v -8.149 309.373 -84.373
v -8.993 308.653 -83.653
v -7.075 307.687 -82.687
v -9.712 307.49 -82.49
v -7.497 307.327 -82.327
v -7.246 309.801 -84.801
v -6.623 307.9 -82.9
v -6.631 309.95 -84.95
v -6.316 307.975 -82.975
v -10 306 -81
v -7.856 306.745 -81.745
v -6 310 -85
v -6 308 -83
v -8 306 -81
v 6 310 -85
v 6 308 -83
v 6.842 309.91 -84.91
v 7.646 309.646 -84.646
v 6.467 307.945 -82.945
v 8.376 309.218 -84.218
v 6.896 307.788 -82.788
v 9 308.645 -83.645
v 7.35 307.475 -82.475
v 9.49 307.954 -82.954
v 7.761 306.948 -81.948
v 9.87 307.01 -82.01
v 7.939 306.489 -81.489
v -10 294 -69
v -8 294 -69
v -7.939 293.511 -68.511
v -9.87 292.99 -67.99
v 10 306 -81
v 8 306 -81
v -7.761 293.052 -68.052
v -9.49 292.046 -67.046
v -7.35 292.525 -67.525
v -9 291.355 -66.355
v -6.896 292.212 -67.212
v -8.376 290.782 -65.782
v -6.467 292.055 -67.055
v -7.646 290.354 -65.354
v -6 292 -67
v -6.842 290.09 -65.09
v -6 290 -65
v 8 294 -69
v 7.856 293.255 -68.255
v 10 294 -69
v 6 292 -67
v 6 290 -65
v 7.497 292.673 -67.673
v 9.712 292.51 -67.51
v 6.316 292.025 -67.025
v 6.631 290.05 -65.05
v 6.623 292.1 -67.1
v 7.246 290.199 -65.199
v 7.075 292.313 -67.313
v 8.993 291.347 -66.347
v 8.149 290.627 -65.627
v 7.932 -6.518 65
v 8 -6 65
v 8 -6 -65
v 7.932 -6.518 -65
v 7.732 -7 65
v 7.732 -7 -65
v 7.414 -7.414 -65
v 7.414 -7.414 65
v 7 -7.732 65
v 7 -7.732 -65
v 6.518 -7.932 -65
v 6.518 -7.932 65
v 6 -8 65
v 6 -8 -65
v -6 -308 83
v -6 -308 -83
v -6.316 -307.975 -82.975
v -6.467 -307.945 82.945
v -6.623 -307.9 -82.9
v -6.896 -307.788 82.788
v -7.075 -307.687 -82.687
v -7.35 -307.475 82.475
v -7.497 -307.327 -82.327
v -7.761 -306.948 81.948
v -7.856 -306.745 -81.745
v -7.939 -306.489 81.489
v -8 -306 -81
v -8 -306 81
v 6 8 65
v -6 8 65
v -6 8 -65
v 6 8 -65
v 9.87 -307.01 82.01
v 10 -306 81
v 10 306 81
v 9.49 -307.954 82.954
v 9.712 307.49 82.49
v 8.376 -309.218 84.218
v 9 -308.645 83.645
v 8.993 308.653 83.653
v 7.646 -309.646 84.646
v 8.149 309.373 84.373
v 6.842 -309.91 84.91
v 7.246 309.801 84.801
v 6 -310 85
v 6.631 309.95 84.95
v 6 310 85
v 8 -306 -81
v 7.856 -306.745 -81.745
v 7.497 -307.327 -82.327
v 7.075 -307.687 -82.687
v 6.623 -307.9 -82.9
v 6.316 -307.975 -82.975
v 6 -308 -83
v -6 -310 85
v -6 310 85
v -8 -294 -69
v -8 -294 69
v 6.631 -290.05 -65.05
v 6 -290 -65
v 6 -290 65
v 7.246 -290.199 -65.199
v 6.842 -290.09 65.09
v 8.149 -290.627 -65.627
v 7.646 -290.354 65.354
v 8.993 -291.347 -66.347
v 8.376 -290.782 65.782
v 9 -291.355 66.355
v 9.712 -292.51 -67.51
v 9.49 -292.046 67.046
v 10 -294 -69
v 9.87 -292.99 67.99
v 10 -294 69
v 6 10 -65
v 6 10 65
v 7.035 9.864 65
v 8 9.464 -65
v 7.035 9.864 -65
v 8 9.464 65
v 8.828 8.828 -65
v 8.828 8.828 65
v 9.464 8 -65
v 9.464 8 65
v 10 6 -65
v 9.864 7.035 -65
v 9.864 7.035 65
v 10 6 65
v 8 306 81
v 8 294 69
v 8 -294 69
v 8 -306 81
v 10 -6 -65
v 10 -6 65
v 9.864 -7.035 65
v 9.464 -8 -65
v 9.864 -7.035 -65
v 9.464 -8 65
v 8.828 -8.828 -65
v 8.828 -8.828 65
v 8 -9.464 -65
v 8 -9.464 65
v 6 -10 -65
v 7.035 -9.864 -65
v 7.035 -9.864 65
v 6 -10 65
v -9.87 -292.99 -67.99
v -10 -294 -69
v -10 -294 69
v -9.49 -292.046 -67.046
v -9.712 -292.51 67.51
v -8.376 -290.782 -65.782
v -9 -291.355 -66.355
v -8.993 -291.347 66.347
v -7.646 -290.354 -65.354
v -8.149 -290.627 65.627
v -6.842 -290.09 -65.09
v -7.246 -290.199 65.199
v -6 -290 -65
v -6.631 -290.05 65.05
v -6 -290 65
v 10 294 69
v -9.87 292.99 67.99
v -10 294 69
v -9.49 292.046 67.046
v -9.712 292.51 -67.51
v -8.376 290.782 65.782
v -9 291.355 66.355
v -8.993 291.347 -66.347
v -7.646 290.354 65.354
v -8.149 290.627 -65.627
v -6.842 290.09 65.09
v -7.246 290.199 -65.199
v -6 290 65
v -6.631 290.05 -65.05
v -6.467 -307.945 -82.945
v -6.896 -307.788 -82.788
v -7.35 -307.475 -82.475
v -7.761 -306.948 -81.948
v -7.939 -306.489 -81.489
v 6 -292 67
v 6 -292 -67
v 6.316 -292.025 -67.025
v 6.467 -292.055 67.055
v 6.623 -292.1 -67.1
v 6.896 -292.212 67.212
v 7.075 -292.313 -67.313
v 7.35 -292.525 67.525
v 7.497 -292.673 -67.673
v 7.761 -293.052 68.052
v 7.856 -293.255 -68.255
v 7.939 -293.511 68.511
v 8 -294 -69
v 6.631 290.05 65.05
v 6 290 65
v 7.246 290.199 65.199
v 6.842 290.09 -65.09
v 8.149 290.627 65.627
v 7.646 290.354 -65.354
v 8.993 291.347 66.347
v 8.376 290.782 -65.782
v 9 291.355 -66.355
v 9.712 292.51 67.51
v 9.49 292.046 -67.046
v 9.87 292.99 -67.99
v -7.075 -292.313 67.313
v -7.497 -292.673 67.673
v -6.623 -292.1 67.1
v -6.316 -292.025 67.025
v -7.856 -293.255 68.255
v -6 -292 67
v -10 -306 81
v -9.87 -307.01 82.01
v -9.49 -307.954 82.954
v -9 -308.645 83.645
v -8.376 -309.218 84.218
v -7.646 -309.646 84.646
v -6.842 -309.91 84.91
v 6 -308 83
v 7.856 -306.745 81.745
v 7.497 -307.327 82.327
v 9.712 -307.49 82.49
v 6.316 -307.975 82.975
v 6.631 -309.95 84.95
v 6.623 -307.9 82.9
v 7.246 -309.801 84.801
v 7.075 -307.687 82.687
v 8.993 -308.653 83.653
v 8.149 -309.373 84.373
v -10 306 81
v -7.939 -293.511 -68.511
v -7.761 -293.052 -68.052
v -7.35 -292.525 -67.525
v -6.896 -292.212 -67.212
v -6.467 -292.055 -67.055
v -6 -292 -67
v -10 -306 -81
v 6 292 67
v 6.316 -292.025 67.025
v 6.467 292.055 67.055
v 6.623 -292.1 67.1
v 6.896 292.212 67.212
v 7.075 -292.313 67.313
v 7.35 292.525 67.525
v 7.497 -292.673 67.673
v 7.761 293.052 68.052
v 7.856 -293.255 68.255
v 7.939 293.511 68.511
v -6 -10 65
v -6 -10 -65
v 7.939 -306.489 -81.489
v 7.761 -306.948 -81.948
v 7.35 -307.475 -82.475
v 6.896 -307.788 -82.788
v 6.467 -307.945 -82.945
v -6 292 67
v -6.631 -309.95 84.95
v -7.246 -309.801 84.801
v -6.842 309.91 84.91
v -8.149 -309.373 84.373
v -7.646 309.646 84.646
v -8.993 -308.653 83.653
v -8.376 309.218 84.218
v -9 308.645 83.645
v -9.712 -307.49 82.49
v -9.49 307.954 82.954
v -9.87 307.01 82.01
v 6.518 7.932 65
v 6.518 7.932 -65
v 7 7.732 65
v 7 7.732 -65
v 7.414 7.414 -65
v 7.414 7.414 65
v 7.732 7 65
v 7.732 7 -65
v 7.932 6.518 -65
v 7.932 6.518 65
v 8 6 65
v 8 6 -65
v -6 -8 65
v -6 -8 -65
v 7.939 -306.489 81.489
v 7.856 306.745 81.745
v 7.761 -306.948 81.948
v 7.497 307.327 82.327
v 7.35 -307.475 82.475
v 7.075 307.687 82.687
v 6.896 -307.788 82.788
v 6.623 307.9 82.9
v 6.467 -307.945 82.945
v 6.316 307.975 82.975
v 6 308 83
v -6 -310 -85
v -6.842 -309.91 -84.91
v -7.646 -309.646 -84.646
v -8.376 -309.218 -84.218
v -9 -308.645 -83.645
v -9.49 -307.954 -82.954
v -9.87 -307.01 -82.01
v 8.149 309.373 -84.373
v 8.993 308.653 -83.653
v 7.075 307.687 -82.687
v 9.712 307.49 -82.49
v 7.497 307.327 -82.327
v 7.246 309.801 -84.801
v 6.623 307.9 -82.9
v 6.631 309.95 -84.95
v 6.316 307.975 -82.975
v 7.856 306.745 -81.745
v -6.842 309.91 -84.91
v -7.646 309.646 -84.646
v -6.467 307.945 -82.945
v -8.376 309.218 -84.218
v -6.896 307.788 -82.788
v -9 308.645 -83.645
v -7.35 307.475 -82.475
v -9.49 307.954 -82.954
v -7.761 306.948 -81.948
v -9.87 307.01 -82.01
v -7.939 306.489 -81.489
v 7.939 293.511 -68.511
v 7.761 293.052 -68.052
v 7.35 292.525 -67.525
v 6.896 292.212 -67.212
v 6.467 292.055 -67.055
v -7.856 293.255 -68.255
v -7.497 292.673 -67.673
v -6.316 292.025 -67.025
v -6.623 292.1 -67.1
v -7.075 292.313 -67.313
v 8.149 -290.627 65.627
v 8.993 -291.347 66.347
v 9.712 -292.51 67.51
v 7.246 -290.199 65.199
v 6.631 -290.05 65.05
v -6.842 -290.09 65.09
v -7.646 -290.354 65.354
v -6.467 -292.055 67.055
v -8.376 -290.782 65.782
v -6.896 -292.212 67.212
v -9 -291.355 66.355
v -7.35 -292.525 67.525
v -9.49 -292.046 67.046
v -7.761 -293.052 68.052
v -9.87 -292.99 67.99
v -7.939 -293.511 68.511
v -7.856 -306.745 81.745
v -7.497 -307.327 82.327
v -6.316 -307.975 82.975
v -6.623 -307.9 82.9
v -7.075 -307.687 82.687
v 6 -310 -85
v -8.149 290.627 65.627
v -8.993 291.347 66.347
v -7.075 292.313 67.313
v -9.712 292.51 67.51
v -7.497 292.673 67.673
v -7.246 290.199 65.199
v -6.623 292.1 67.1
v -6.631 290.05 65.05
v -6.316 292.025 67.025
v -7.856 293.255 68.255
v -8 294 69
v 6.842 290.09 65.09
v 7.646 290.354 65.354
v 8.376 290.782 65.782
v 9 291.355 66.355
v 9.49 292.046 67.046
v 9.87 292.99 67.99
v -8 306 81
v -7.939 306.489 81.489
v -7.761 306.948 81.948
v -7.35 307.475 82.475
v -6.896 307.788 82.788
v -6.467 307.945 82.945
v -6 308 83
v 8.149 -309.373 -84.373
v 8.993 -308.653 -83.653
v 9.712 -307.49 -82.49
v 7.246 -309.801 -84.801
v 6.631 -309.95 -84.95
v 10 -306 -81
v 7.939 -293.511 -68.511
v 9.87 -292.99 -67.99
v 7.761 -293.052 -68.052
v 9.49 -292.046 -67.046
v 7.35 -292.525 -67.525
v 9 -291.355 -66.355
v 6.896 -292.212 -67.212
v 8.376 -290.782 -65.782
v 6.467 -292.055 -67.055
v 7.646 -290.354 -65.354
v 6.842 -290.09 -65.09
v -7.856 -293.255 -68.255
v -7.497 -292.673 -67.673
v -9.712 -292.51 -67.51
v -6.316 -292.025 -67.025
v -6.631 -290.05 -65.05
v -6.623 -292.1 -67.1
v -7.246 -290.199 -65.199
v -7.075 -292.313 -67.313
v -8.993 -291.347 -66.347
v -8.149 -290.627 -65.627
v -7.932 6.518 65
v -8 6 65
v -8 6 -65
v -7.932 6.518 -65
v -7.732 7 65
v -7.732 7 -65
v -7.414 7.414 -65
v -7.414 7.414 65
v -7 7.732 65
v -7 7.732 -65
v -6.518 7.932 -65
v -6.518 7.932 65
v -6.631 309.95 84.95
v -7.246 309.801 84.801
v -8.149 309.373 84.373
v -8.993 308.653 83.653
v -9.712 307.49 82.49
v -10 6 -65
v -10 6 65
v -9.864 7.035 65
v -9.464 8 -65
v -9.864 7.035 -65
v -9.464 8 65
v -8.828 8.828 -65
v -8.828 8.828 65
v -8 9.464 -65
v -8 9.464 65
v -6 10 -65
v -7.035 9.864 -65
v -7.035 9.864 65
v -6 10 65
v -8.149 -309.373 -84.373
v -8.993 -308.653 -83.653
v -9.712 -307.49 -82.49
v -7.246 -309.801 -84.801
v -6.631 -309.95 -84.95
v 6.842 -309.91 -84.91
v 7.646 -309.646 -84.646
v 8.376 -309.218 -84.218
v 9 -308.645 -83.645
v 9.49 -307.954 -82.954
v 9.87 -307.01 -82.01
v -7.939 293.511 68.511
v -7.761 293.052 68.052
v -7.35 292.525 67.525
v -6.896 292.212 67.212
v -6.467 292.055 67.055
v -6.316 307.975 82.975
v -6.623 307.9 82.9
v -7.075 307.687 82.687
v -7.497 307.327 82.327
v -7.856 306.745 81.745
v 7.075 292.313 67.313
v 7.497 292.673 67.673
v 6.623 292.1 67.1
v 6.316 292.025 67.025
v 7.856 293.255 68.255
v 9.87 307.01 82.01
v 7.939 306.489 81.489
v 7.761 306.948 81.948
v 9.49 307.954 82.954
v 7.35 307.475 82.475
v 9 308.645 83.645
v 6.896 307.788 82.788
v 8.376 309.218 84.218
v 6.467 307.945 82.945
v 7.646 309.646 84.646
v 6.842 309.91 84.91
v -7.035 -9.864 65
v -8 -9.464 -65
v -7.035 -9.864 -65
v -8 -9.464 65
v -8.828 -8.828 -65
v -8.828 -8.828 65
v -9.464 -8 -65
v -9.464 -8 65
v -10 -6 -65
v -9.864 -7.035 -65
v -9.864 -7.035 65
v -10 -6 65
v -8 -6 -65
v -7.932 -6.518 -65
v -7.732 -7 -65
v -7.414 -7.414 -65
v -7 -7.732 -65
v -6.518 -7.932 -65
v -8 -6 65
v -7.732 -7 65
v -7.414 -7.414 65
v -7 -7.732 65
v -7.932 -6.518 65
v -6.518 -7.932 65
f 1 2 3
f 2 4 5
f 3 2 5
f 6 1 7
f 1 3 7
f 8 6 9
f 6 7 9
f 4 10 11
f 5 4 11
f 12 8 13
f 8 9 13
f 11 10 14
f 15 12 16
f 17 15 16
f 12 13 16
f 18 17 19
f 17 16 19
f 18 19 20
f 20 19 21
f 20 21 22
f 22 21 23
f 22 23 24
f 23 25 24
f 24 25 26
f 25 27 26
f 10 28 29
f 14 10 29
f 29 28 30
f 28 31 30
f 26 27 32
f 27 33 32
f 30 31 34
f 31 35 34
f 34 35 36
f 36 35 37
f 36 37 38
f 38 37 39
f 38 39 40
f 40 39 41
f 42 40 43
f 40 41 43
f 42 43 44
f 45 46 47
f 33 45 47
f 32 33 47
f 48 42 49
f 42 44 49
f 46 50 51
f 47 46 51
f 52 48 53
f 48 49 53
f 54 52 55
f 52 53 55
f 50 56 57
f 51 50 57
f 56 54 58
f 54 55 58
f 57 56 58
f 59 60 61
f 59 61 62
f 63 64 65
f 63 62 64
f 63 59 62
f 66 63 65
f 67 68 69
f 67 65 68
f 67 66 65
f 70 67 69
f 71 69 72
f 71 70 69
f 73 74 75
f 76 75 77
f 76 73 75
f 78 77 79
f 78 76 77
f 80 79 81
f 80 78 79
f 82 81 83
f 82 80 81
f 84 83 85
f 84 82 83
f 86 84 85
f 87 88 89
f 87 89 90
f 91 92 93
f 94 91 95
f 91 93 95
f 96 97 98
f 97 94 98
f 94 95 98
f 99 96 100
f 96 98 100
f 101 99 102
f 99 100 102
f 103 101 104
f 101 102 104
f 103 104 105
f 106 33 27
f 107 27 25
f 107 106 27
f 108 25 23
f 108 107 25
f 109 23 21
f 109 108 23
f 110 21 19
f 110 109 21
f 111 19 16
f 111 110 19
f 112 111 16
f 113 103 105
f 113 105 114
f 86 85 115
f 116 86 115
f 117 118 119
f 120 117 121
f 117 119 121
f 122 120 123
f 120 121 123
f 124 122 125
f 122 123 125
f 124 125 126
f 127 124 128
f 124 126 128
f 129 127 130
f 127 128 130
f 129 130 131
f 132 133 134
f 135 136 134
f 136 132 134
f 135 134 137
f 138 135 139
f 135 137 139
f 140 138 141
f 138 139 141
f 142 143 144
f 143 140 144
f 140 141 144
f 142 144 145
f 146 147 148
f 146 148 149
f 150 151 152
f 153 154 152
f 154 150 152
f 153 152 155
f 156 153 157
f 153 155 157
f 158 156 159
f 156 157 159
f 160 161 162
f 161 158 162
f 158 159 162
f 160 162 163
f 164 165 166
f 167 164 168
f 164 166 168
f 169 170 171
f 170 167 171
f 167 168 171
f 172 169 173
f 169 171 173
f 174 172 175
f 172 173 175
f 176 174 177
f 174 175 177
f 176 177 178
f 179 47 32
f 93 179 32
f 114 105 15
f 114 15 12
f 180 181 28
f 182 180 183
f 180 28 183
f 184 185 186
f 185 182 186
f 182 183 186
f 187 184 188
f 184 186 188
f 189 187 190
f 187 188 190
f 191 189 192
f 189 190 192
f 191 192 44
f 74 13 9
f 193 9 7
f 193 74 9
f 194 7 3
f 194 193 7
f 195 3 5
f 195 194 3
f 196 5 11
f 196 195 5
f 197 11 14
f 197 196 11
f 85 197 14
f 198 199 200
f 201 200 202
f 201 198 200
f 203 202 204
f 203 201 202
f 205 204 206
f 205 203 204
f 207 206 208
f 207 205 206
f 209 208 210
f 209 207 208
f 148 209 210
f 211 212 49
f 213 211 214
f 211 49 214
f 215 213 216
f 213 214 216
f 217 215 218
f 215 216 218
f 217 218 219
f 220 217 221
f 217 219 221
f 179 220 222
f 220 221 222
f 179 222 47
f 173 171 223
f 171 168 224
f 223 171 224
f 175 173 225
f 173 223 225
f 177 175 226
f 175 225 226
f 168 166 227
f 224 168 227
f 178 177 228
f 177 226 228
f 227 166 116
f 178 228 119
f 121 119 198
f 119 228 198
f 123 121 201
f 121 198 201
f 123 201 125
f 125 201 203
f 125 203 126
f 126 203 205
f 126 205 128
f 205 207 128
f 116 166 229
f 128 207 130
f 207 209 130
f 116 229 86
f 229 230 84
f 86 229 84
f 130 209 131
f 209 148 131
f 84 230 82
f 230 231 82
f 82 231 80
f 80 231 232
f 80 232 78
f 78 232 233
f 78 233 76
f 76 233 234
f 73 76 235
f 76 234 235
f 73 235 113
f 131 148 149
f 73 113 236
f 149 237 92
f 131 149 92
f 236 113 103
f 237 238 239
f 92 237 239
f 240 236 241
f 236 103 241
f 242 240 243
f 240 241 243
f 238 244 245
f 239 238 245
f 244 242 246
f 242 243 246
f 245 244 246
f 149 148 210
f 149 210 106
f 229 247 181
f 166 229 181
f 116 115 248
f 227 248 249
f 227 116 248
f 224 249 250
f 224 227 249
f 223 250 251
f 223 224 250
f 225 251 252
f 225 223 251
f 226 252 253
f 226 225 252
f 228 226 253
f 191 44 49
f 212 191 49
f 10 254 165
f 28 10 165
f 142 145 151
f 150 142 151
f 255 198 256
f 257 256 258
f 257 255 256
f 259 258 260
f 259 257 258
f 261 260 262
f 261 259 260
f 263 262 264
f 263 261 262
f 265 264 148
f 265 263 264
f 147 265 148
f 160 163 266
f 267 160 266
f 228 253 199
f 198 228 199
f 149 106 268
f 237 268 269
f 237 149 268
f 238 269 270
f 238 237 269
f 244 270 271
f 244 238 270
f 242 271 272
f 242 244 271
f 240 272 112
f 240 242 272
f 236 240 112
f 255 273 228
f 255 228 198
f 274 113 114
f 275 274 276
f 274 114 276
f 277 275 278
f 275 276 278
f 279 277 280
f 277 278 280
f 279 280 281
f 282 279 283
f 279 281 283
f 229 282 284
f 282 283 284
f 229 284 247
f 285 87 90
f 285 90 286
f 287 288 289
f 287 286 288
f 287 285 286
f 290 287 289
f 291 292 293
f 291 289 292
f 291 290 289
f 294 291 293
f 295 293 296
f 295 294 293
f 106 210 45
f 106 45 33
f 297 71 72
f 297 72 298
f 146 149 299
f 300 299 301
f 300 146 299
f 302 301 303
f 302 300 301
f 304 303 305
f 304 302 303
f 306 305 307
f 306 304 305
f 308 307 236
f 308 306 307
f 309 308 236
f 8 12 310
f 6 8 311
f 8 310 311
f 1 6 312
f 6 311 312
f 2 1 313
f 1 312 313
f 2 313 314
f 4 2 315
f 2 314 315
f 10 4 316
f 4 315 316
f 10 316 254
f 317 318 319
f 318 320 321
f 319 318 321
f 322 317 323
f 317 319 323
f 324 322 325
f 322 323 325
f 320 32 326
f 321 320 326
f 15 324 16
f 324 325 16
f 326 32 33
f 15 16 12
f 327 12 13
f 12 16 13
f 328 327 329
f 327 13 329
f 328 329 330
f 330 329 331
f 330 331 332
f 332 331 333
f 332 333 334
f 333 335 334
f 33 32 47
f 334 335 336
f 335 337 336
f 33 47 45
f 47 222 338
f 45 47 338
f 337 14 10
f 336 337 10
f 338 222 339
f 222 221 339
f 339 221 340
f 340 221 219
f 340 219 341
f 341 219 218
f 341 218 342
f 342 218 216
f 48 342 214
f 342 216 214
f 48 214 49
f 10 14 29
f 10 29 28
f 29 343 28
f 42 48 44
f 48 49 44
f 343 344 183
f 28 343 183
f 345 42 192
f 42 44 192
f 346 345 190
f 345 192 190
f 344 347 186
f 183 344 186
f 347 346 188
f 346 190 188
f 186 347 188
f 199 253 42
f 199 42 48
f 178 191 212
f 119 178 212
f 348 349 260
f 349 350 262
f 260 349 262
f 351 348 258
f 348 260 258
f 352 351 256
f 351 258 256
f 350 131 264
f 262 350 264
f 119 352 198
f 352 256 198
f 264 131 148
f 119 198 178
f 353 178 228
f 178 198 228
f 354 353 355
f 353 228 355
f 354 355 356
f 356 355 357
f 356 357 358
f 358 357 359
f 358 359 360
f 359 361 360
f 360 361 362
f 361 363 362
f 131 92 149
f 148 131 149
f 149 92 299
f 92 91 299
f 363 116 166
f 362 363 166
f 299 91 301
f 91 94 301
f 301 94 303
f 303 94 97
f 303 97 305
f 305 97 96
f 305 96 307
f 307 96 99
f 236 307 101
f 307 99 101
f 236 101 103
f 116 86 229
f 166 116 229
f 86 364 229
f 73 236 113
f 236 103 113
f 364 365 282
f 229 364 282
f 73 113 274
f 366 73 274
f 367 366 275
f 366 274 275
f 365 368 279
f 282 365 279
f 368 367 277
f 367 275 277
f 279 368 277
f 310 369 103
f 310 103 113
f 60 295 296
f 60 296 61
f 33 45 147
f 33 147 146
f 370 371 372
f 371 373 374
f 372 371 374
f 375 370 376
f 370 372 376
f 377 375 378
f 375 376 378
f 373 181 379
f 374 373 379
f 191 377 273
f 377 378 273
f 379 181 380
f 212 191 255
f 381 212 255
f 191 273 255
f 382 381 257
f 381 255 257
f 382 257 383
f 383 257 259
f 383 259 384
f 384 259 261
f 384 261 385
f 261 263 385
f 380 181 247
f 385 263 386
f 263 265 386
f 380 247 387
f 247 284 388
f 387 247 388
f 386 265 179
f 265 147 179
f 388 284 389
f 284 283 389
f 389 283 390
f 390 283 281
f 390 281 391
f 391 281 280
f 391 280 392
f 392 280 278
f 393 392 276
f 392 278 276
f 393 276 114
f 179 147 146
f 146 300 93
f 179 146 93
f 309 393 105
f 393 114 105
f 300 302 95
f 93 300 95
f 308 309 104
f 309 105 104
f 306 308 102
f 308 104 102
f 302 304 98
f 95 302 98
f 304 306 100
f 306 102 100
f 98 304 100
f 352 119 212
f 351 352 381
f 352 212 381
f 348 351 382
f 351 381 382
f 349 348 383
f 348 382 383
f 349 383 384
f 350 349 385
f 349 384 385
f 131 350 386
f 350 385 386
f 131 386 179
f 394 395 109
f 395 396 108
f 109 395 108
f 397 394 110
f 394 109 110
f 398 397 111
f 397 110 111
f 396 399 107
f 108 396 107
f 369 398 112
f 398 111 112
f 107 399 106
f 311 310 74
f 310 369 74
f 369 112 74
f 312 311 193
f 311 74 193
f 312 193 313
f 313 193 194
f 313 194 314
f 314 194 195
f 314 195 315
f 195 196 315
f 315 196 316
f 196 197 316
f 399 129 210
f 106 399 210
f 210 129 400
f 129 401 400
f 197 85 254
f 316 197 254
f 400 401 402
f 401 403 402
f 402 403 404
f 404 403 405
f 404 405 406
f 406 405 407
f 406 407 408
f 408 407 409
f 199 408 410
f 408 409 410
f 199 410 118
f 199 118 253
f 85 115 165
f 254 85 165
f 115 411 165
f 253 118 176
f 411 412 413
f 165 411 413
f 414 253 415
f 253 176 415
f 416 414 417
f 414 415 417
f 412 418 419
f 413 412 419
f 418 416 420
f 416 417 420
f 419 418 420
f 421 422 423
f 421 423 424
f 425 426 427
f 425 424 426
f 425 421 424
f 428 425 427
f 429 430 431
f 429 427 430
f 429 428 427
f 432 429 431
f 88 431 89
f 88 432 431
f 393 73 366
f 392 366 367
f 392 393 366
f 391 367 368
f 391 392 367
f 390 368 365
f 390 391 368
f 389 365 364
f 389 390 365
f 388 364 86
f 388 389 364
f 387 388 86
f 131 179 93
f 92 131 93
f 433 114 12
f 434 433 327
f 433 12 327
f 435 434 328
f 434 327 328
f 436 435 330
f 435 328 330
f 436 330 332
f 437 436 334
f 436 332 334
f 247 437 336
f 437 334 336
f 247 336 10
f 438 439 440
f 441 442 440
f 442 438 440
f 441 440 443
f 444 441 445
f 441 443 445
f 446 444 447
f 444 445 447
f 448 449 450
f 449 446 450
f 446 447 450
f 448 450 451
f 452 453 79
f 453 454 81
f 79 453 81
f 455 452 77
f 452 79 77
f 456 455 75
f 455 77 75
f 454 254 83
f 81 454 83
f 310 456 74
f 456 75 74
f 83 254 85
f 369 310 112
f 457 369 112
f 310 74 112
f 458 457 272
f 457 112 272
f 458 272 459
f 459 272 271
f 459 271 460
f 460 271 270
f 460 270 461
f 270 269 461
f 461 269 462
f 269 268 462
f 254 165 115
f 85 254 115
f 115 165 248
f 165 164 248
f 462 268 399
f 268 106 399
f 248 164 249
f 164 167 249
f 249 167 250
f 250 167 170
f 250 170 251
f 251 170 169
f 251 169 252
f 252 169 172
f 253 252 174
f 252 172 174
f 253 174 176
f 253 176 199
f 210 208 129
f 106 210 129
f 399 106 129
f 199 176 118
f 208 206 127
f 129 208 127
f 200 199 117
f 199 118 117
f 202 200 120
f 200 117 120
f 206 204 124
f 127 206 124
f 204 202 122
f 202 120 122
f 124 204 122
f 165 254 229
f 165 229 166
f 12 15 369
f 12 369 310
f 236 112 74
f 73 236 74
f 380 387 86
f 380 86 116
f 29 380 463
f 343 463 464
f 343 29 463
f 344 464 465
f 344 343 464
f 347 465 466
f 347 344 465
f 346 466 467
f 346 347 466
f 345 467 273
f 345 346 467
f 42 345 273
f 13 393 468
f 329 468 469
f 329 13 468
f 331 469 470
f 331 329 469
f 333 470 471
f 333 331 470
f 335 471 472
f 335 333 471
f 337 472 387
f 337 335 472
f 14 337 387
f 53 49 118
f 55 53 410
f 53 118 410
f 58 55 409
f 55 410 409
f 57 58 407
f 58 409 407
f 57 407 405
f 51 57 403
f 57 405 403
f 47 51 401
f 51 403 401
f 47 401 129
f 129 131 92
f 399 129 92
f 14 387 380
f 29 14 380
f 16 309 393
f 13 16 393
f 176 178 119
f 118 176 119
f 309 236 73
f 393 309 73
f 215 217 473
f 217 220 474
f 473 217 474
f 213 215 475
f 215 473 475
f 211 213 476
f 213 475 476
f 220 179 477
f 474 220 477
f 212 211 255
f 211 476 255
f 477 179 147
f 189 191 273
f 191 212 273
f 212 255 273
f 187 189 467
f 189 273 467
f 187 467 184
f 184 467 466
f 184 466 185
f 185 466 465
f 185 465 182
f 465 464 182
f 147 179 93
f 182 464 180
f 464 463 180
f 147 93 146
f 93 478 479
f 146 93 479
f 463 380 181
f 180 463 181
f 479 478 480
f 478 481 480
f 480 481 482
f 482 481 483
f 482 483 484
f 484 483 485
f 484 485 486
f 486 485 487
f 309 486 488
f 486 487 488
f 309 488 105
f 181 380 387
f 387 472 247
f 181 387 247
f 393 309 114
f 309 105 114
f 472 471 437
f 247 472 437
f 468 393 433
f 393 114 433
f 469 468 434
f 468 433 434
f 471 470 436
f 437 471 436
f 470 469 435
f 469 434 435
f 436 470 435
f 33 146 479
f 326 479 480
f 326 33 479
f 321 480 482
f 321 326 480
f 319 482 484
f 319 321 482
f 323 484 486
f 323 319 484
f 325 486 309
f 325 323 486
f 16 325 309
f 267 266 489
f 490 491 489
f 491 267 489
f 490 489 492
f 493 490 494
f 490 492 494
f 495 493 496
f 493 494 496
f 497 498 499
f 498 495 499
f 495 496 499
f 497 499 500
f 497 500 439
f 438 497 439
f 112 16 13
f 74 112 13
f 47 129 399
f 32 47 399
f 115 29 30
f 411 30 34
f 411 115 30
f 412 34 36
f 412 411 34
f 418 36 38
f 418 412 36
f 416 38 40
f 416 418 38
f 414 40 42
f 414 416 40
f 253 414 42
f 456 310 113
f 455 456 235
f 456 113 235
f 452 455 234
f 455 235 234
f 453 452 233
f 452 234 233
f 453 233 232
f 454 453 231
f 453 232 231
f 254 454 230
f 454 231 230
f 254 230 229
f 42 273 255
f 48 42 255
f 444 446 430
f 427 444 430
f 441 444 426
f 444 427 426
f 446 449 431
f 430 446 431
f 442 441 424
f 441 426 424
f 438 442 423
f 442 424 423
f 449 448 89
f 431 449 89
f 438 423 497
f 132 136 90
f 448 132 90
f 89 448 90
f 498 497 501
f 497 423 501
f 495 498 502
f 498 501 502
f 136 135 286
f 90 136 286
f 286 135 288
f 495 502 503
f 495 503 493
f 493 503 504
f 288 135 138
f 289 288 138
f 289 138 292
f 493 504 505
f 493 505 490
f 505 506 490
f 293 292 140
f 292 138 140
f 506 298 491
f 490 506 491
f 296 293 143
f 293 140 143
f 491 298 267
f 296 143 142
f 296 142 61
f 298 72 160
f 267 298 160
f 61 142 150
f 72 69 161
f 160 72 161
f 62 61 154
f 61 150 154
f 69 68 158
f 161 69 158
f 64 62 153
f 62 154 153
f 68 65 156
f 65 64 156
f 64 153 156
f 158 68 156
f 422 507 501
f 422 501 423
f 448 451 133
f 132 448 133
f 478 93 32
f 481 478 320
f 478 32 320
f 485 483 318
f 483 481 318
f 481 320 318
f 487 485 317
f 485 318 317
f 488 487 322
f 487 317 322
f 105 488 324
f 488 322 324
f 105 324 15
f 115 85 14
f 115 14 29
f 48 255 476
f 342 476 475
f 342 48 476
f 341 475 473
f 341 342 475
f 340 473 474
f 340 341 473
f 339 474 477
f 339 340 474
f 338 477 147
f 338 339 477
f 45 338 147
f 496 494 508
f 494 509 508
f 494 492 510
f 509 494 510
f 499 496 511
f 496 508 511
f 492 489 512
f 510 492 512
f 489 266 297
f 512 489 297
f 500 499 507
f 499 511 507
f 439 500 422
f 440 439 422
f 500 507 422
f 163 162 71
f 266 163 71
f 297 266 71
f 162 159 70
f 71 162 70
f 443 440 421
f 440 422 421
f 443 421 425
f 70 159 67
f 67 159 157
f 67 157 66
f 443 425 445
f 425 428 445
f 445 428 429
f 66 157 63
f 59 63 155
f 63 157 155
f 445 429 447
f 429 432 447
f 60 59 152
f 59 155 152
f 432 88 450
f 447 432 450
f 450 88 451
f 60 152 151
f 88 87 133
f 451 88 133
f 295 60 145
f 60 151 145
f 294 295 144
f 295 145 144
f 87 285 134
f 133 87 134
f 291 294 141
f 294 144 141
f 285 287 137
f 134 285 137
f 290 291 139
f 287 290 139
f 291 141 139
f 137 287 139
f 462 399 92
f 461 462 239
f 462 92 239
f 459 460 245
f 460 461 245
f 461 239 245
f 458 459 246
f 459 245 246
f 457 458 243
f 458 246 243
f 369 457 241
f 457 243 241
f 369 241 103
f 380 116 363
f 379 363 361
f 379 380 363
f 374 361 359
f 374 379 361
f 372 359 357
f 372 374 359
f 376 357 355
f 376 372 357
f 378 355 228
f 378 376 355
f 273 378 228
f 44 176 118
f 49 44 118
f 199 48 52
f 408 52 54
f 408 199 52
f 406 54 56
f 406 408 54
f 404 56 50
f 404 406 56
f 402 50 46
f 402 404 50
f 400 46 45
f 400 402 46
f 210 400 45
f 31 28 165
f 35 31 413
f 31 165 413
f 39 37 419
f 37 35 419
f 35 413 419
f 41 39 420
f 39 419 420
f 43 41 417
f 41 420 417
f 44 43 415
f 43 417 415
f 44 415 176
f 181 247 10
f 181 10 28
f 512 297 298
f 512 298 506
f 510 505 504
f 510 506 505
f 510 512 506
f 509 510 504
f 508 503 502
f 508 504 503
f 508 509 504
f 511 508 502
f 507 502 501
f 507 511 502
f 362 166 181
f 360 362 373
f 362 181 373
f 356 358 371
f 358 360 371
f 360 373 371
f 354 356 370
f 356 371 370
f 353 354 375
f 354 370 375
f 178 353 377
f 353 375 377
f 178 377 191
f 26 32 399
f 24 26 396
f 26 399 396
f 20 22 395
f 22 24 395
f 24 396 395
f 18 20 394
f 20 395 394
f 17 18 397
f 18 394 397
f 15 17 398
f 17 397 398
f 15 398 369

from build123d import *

# Parameters (mm, degrees)
TUBO_CUADRADO_20_X_20_X_2_1_DEPTH      = 615.142135624
TUBO_CUADRADO_20_X_20_X_2_1_DEPTH_BACK = 15.142135624
TUBO_CUADRADO_20_X_20_X_2_1_2_DEPTH    = 180.284271247
TUBO_CUADRADO_20_X_20_X_2_1_3_DEPTH    = 630.284271247
TUBO_CUADRADO_20_X_20_X_2_1_4_DEPTH    = 180.284271247
TUBO_CUADRADO_20_X_20_X_2_1_5_DEPTH    = 152


with BuildPart() as part:
    # Sketch1 → Tubo cuadrado 20 X 20 X 2(1) (new, two sides: drawn at the far end of the back side and taken through both)
    with BuildSketch(Plane(origin=(0, 300, 75), x_dir=(0, 0, -1), z_dir=(0, -1, 0)).offset(-TUBO_CUADRADO_20_X_20_X_2_1_DEPTH_BACK)):
        with BuildLine():
            Line((-6, -10), (6, -10))
            ThreePointArc((6, -10), (8.828427125, -8.828427125), (10, -6))
            Line((10, -6), (10, 6))
            ThreePointArc((10, 6), (8.828427125, 8.828427125), (6, 10))
            Line((6, 10), (-6, 10))
            ThreePointArc((-6, 10), (-8.828427125, 8.828427125), (-10, 6))
            Line((-10, 6), (-10, -6))
            ThreePointArc((-10, -6), (-8.828427125, -8.828427125), (-6, -10))
        make_face()
        with BuildLine():
            Line((-6, -8), (6, -8))
            ThreePointArc((6, -8), (7.414213562, -7.414213562), (8, -6))
            Line((8, -6), (8, 6))
            ThreePointArc((8, 6), (7.414213562, 7.414213562), (6, 8))
            Line((6, 8), (-6, 8))
            ThreePointArc((-6, 8), (-7.414213562, 7.414213562), (-8, 6))
            Line((-8, 6), (-8, -6))
            ThreePointArc((-8, -6), (-7.414213562, -7.414213562), (-6, -8))
        make_face(mode=Mode.SUBTRACT)
    extrude(amount=TUBO_CUADRADO_20_X_20_X_2_1_DEPTH + TUBO_CUADRADO_20_X_20_X_2_1_DEPTH_BACK)

    # Tubo cuadrado 20 X 20 X 2(1) mitre 1
    split(bisect_by=Plane(origin=(0, 300, 75), x_dir=(1, 0, 0), z_dir=(0, -0.707106781, 0.707106781)), keep=Keep.TOP)

    # Tubo cuadrado 20 X 20 X 2(1) mitre 2
    split(bisect_by=Plane(origin=(0, -300, 75), x_dir=(-1, 0, 0), z_dir=(0, 0.707106781, 0.707106781)), keep=Keep.TOP)


with BuildPart() as body_2:
    # Sketch1 on segment 2 (carried to segment 2) → Tubo cuadrado 20 X 20 X 2_1 2 (new body)
    with BuildSketch(Plane(origin=(0, -300, 90.142135624), x_dir=(0, 1, 0), z_dir=(0, 0, -1))):
        with BuildLine():
            Line((-6, -10), (6, -10))
            ThreePointArc((6, -10), (8.828427125, -8.828427125), (10, -6))
            Line((10, -6), (10, 6))
            ThreePointArc((10, 6), (8.828427125, 8.828427125), (6, 10))
            Line((6, 10), (-6, 10))
            ThreePointArc((-6, 10), (-8.828427125, 8.828427125), (-10, 6))
            Line((-10, 6), (-10, -6))
            ThreePointArc((-10, -6), (-8.828427125, -8.828427125), (-6, -10))
        make_face()
        with BuildLine():
            Line((-6, -8), (6, -8))
            ThreePointArc((6, -8), (7.414213562, -7.414213562), (8, -6))
            Line((8, -6), (8, 6))
            ThreePointArc((8, 6), (7.414213562, 7.414213562), (6, 8))
            Line((6, 8), (-6, 8))
            ThreePointArc((-6, 8), (-7.414213562, 7.414213562), (-8, 6))
            Line((-8, 6), (-8, -6))
            ThreePointArc((-8, -6), (-7.414213562, -7.414213562), (-6, -8))
        make_face(mode=Mode.SUBTRACT)
    extrude(amount=TUBO_CUADRADO_20_X_20_X_2_1_2_DEPTH)

    # Tubo cuadrado 20 X 20 X 2_1 2 mitre 1
    split(bisect_by=Plane(origin=(0, -300, 75), x_dir=(1, 0, 0), z_dir=(0, -0.707106781, -0.707106781)), keep=Keep.TOP)

    # Tubo cuadrado 20 X 20 X 2_1 2 mitre 2
    split(bisect_by=Plane(origin=(0, -300, -75), x_dir=(1, 0, 0), z_dir=(0, -0.707106781, 0.707106781)), keep=Keep.TOP)


with BuildPart() as body_3:
    # Sketch1 on segment 3 (carried to segment 3) → Tubo cuadrado 20 X 20 X 2_1 3 (new body)
    with BuildSketch(Plane(origin=(0, -315.142135624, -75), x_dir=(0, 0, 1), z_dir=(0, 1, 0))):
        with BuildLine():
            Line((-6, -10), (6, -10))
            ThreePointArc((6, -10), (8.828427125, -8.828427125), (10, -6))
            Line((10, -6), (10, 6))
            ThreePointArc((10, 6), (8.828427125, 8.828427125), (6, 10))
            Line((6, 10), (-6, 10))
            ThreePointArc((-6, 10), (-8.828427125, 8.828427125), (-10, 6))
            Line((-10, 6), (-10, -6))
            ThreePointArc((-10, -6), (-8.828427125, -8.828427125), (-6, -10))
        make_face()
        with BuildLine():
            Line((-6, -8), (6, -8))
            ThreePointArc((6, -8), (7.414213562, -7.414213562), (8, -6))
            Line((8, -6), (8, 6))
            ThreePointArc((8, 6), (7.414213562, 7.414213562), (6, 8))
            Line((6, 8), (-6, 8))
            ThreePointArc((-6, 8), (-7.414213562, 7.414213562), (-8, 6))
            Line((-8, 6), (-8, -6))
            ThreePointArc((-8, -6), (-7.414213562, -7.414213562), (-6, -8))
        make_face(mode=Mode.SUBTRACT)
    extrude(amount=TUBO_CUADRADO_20_X_20_X_2_1_3_DEPTH)

    # Tubo cuadrado 20 X 20 X 2_1 3 mitre 1
    split(bisect_by=Plane(origin=(0, 300, -75), x_dir=(1, 0, 0), z_dir=(0, -0.707106781, -0.707106781)), keep=Keep.TOP)

    # Tubo cuadrado 20 X 20 X 2_1 3 mitre 2
    split(bisect_by=Plane(origin=(0, -300, -75), x_dir=(-1, 0, 0), z_dir=(0, 0.707106781, -0.707106781)), keep=Keep.TOP)


with BuildPart() as body_4:
    # Sketch1 on segment 4 (carried to segment 4) → Tubo cuadrado 20 X 20 X 2_1 4 (new body)
    with BuildSketch(Plane(origin=(0, 300, -90.142135624), x_dir=(0, -1, 0), z_dir=(0, 0, 1))):
        with BuildLine():
            Line((-6, -10), (6, -10))
            ThreePointArc((6, -10), (8.828427125, -8.828427125), (10, -6))
            Line((10, -6), (10, 6))
            ThreePointArc((10, 6), (8.828427125, 8.828427125), (6, 10))
            Line((6, 10), (-6, 10))
            ThreePointArc((-6, 10), (-8.828427125, 8.828427125), (-10, 6))
            Line((-10, 6), (-10, -6))
            ThreePointArc((-10, -6), (-8.828427125, -8.828427125), (-6, -10))
        make_face()
        with BuildLine():
            Line((-6, -8), (6, -8))
            ThreePointArc((6, -8), (7.414213562, -7.414213562), (8, -6))
            Line((8, -6), (8, 6))
            ThreePointArc((8, 6), (7.414213562, 7.414213562), (6, 8))
            Line((6, 8), (-6, 8))
            ThreePointArc((-6, 8), (-7.414213562, 7.414213562), (-8, 6))
            Line((-8, 6), (-8, -6))
            ThreePointArc((-8, -6), (-7.414213562, -7.414213562), (-6, -8))
        make_face(mode=Mode.SUBTRACT)
    extrude(amount=TUBO_CUADRADO_20_X_20_X_2_1_4_DEPTH)

    # Tubo cuadrado 20 X 20 X 2_1 4 mitre 1
    split(bisect_by=Plane(origin=(0, 300, 75), x_dir=(-1, 0, 0), z_dir=(0, 0.707106781, -0.707106781)), keep=Keep.TOP)

    # Tubo cuadrado 20 X 20 X 2_1 4 mitre 2
    split(bisect_by=Plane(origin=(0, 300, -75), x_dir=(-1, 0, 0), z_dir=(0, 0.707106781, 0.707106781)), keep=Keep.TOP)


with BuildPart() as body_5:
    # Sketch1 on segment 5 (carried to segment 5) → Tubo cuadrado 20 X 20 X 2_1 5 (new body)
    with BuildSketch(Plane.YX.offset(-76)):
        with BuildLine():
            Line((-6, -10), (6, -10))
            ThreePointArc((6, -10), (8.828427125, -8.828427125), (10, -6))
            Line((10, -6), (10, 6))
            ThreePointArc((10, 6), (8.828427125, 8.828427125), (6, 10))
            Line((6, 10), (-6, 10))
            ThreePointArc((-6, 10), (-8.828427125, 8.828427125), (-10, 6))
            Line((-10, 6), (-10, -6))
            ThreePointArc((-10, -6), (-8.828427125, -8.828427125), (-6, -10))
        make_face()
        with BuildLine():
            Line((-6, -8), (6, -8))
            ThreePointArc((6, -8), (7.414213562, -7.414213562), (8, -6))
            Line((8, -6), (8, 6))
            ThreePointArc((8, 6), (7.414213562, 7.414213562), (6, 8))
            Line((6, 8), (-6, 8))
            ThreePointArc((-6, 8), (-7.414213562, 7.414213562), (-8, 6))
            Line((-8, 6), (-8, -6))
            ThreePointArc((-8, -6), (-7.414213562, -7.414213562), (-6, -8))
        make_face(mode=Mode.SUBTRACT)
    extrude(amount=TUBO_CUADRADO_20_X_20_X_2_1_5_DEPTH)

    # Tubo cuadrado 20 X 20 X 2_1 5 mitre 1
    split(bisect_by=Plane.YX.offset(-65), keep=Keep.TOP)

    # Tubo cuadrado 20 X 20 X 2_1 5 mitre 2
    split(bisect_by=Plane(origin=(0, 0, -65), x_dir=(0, -1, 0), z_dir=(0, 0, 1)), keep=Keep.TOP)


solid = Compound([part.part, body_2.part, body_3.part, body_4.part, body_5.part])
